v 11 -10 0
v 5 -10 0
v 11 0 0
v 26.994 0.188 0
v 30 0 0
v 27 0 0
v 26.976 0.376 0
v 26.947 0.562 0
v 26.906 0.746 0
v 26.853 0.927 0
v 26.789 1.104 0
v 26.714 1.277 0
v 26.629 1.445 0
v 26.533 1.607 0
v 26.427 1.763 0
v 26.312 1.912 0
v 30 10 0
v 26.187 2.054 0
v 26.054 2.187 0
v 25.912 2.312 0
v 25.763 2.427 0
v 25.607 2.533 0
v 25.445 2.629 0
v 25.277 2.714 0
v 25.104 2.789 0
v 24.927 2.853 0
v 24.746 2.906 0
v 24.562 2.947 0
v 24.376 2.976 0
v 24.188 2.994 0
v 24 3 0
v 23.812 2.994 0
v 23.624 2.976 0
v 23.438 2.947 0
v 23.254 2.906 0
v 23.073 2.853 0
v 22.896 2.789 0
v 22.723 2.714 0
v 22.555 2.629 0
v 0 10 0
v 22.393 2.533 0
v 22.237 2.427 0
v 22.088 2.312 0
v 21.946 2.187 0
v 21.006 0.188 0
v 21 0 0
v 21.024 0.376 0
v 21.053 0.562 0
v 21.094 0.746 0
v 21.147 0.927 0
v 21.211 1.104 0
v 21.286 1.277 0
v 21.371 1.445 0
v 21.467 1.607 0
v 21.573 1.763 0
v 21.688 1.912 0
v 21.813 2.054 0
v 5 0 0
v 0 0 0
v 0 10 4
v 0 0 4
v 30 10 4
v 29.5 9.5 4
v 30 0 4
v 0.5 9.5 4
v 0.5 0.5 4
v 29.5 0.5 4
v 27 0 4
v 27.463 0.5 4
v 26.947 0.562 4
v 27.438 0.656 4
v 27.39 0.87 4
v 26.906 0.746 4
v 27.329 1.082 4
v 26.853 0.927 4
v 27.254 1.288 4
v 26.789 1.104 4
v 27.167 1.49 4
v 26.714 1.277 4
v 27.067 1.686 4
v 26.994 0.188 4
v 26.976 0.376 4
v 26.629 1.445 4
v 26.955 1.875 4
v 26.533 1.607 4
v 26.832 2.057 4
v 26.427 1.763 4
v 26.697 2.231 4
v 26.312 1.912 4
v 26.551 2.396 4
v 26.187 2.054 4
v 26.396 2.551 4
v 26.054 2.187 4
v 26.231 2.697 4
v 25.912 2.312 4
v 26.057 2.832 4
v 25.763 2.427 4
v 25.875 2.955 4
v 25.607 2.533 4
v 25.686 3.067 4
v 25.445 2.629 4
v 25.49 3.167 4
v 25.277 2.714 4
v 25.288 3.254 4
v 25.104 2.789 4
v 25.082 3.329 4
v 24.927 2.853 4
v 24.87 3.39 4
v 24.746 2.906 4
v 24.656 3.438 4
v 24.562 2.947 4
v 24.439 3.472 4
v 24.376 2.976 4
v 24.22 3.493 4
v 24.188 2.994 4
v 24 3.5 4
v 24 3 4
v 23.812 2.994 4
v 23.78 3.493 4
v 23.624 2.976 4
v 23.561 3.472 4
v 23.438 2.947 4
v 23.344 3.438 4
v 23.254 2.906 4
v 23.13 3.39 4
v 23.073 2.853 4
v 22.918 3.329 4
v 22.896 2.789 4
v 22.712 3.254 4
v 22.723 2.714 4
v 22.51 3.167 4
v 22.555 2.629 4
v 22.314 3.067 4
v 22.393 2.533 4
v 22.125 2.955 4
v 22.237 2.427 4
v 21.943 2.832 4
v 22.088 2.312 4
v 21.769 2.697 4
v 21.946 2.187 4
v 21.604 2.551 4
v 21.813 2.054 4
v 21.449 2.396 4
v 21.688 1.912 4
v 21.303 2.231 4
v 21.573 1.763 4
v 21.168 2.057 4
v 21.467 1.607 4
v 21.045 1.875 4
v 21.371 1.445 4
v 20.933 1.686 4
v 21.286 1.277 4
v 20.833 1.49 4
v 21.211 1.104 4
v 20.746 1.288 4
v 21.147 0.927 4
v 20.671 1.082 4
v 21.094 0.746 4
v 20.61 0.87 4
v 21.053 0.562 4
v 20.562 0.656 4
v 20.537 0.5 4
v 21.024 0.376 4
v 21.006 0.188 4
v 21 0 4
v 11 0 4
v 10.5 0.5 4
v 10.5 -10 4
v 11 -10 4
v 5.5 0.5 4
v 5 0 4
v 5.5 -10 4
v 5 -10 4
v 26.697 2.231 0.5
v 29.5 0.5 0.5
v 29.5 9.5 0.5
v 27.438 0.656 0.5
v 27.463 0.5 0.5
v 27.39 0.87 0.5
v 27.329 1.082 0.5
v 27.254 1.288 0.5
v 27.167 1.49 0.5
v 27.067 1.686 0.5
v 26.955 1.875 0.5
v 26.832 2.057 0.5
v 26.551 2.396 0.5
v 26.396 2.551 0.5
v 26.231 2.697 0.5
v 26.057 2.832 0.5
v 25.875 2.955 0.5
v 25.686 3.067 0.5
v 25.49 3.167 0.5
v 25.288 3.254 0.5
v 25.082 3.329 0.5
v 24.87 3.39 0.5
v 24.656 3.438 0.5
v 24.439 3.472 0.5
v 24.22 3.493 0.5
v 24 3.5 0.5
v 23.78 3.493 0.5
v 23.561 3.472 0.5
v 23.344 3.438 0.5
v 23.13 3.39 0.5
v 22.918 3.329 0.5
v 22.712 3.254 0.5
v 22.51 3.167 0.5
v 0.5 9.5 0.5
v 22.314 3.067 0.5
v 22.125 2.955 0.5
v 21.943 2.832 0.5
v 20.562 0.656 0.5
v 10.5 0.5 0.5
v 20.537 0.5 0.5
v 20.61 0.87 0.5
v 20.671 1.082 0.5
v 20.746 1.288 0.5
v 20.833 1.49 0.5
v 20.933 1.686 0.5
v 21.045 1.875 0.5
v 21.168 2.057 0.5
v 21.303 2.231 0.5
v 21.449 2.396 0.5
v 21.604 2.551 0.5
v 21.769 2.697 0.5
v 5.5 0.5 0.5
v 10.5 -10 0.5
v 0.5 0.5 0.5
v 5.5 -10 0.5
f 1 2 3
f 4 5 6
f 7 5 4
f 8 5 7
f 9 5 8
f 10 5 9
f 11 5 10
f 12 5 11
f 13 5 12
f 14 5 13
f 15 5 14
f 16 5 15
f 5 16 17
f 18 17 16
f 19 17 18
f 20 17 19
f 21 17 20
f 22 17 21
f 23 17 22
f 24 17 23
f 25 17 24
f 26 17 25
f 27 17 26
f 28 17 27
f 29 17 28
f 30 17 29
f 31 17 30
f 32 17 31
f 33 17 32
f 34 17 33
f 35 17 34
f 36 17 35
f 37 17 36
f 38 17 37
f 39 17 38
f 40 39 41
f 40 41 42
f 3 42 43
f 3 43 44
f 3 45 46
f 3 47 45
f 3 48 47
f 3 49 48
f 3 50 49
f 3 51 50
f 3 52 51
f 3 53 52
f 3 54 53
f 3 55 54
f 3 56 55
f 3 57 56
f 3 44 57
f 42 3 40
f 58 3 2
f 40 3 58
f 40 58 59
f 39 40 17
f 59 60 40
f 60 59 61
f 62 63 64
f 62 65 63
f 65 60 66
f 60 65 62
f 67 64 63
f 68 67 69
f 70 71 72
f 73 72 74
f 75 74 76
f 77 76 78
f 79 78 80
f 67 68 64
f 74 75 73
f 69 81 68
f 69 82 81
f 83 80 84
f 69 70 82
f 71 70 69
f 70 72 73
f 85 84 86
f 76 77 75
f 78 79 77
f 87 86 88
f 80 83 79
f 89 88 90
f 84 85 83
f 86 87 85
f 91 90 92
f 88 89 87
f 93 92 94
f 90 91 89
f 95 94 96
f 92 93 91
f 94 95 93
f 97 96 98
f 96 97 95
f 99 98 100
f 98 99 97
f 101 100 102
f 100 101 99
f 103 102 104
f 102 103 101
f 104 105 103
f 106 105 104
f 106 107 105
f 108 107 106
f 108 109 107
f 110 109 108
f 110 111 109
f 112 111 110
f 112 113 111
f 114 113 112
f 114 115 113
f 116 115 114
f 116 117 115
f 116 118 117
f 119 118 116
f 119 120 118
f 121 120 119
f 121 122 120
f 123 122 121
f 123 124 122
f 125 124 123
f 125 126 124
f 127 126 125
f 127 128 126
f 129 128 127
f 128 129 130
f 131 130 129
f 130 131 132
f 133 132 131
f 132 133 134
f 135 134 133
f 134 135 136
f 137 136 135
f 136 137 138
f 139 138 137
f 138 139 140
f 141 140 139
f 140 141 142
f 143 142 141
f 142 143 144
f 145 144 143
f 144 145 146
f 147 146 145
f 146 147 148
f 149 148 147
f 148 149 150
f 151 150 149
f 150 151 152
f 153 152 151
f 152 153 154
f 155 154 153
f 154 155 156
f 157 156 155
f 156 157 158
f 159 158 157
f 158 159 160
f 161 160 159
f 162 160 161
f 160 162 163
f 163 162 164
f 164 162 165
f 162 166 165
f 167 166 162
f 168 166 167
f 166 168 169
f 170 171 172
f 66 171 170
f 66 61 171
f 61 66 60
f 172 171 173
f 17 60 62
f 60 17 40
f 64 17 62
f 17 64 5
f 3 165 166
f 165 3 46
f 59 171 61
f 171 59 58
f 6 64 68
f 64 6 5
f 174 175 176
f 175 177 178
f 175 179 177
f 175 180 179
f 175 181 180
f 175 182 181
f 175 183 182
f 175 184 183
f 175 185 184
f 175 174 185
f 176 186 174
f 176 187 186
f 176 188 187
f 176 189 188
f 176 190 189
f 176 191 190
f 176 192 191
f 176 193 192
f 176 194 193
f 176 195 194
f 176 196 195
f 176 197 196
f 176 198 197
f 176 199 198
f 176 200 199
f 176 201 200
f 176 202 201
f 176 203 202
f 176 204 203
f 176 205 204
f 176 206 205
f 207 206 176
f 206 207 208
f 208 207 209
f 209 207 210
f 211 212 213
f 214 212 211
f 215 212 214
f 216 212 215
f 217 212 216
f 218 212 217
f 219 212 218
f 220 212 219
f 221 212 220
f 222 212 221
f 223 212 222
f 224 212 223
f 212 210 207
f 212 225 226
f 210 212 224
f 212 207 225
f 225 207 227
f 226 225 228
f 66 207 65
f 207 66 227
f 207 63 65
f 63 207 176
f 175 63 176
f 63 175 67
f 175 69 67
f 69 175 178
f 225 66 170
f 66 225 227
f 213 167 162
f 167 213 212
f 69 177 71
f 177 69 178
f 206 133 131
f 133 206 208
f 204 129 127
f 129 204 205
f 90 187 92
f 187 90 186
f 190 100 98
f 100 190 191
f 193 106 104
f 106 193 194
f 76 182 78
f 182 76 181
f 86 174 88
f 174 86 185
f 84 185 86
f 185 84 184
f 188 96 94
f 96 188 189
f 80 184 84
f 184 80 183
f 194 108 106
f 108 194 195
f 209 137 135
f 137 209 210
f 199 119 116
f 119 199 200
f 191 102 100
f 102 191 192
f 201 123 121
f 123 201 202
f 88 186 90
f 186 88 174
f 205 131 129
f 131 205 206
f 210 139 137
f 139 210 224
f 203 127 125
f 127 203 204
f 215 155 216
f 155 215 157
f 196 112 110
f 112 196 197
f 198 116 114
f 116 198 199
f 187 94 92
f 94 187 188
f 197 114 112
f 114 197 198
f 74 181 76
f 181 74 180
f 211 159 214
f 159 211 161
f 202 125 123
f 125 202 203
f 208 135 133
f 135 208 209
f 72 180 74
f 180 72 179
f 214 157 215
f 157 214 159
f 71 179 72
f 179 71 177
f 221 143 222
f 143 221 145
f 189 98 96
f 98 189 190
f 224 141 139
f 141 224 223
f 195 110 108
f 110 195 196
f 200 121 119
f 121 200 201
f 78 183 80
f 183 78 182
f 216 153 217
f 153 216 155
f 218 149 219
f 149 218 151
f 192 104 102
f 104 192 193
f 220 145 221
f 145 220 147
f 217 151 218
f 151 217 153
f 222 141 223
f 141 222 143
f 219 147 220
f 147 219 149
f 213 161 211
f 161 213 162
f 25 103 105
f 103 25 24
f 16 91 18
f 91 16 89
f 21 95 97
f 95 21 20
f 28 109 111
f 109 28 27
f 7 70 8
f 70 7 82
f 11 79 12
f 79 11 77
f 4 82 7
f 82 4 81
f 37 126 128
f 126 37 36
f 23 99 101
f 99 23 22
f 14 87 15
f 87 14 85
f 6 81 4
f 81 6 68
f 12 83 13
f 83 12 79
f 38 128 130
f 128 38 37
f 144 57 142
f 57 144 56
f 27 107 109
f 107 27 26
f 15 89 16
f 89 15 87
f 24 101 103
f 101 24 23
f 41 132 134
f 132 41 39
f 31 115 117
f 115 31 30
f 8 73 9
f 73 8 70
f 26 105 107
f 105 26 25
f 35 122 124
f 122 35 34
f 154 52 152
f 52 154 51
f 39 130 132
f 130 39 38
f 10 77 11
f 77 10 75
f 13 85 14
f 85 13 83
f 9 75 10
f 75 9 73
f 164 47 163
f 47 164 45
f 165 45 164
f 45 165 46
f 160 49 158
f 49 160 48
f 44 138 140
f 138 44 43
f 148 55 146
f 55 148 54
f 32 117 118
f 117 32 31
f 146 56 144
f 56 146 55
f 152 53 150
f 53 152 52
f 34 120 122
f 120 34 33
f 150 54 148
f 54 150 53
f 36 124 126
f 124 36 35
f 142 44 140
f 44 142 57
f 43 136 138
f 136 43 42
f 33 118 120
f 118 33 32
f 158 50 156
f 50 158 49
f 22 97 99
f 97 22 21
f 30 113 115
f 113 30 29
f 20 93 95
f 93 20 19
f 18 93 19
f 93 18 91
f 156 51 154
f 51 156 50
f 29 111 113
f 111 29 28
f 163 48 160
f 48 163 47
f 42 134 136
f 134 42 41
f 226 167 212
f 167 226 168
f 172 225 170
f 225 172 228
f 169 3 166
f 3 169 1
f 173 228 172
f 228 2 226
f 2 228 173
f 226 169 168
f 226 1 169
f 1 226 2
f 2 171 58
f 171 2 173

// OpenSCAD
width = 30;
depth = 10;
height = 4;
thickness = 0.5;
faucet_radius = 3;
faucet_offset = 24;
spout_offset = 5;
spout_width = 5;
spout_length = 10;
$fs=0.1;
$fn=100;

// The 2d footprint of the main basin (without the faucet accomodation)
module footprint() {
    square([width, depth]);
}

// The 3d boundary to which we'll clip the entire thing
module boundary() {
    linear_extrude(height = height) {
        footprint();
    }
}

// The base plus the lip, without the cylinder indentation.
module basin() {
    difference() {
        boundary();
        translate([thickness, thickness, thickness]) {
            resize([width - thickness * 2, 
                    depth - thickness * 2, 
                    height]) 
            {
                boundary();
            }
        }
    }
}

module faucet_outer_cylinder() {
    translate([faucet_offset, 0, 0]) {
        cylinder(r=faucet_radius + thickness, h=height);
    }
}

module faucet_inner_cylinder() {
    translate([faucet_offset, 0, -0.5 * height]) {
        cylinder(r=faucet_radius, h=height * 2);
    }
}

// TODO: Spout to drain into sink.
// TODO: Slight tilt to basin floor to direct water out.
// TODO: "slats" to raise the contents off the floor.

module basin_with_faucet() {
    // Clip the model to the boundary.
    intersection() {
        // Subtract out the inner faucet cylinder
        difference() {
            // Combine the basin and the outer cylinder
            union() {
                basin();
                faucet_outer_cylinder();
            };
            faucet_inner_cylinder();
        };
        boundary();
    }
}

module basin_with_spout_gap() {
    difference () {
        basin_with_faucet();
        translate([spout_offset + thickness, -thickness * 0.5, thickness]) {
            cube([spout_width, thickness * 2, height]);
        }
    }    
}

module spout() {
    rotate([90, 0, 0]) {
        difference() {
            cube([spout_width + thickness * 2, height, spout_length]);
            translate([thickness, thickness, -0.1]) {
                cube([spout_width, height - thickness * 0.8, spout_length * 1.1]);
            }
        }
    }
}

module full_model() {
    union() {
        basin_with_spout_gap();
        translate([spout_offset, 0, 0]) {
            spout();
        }
    }
}

full_model();
